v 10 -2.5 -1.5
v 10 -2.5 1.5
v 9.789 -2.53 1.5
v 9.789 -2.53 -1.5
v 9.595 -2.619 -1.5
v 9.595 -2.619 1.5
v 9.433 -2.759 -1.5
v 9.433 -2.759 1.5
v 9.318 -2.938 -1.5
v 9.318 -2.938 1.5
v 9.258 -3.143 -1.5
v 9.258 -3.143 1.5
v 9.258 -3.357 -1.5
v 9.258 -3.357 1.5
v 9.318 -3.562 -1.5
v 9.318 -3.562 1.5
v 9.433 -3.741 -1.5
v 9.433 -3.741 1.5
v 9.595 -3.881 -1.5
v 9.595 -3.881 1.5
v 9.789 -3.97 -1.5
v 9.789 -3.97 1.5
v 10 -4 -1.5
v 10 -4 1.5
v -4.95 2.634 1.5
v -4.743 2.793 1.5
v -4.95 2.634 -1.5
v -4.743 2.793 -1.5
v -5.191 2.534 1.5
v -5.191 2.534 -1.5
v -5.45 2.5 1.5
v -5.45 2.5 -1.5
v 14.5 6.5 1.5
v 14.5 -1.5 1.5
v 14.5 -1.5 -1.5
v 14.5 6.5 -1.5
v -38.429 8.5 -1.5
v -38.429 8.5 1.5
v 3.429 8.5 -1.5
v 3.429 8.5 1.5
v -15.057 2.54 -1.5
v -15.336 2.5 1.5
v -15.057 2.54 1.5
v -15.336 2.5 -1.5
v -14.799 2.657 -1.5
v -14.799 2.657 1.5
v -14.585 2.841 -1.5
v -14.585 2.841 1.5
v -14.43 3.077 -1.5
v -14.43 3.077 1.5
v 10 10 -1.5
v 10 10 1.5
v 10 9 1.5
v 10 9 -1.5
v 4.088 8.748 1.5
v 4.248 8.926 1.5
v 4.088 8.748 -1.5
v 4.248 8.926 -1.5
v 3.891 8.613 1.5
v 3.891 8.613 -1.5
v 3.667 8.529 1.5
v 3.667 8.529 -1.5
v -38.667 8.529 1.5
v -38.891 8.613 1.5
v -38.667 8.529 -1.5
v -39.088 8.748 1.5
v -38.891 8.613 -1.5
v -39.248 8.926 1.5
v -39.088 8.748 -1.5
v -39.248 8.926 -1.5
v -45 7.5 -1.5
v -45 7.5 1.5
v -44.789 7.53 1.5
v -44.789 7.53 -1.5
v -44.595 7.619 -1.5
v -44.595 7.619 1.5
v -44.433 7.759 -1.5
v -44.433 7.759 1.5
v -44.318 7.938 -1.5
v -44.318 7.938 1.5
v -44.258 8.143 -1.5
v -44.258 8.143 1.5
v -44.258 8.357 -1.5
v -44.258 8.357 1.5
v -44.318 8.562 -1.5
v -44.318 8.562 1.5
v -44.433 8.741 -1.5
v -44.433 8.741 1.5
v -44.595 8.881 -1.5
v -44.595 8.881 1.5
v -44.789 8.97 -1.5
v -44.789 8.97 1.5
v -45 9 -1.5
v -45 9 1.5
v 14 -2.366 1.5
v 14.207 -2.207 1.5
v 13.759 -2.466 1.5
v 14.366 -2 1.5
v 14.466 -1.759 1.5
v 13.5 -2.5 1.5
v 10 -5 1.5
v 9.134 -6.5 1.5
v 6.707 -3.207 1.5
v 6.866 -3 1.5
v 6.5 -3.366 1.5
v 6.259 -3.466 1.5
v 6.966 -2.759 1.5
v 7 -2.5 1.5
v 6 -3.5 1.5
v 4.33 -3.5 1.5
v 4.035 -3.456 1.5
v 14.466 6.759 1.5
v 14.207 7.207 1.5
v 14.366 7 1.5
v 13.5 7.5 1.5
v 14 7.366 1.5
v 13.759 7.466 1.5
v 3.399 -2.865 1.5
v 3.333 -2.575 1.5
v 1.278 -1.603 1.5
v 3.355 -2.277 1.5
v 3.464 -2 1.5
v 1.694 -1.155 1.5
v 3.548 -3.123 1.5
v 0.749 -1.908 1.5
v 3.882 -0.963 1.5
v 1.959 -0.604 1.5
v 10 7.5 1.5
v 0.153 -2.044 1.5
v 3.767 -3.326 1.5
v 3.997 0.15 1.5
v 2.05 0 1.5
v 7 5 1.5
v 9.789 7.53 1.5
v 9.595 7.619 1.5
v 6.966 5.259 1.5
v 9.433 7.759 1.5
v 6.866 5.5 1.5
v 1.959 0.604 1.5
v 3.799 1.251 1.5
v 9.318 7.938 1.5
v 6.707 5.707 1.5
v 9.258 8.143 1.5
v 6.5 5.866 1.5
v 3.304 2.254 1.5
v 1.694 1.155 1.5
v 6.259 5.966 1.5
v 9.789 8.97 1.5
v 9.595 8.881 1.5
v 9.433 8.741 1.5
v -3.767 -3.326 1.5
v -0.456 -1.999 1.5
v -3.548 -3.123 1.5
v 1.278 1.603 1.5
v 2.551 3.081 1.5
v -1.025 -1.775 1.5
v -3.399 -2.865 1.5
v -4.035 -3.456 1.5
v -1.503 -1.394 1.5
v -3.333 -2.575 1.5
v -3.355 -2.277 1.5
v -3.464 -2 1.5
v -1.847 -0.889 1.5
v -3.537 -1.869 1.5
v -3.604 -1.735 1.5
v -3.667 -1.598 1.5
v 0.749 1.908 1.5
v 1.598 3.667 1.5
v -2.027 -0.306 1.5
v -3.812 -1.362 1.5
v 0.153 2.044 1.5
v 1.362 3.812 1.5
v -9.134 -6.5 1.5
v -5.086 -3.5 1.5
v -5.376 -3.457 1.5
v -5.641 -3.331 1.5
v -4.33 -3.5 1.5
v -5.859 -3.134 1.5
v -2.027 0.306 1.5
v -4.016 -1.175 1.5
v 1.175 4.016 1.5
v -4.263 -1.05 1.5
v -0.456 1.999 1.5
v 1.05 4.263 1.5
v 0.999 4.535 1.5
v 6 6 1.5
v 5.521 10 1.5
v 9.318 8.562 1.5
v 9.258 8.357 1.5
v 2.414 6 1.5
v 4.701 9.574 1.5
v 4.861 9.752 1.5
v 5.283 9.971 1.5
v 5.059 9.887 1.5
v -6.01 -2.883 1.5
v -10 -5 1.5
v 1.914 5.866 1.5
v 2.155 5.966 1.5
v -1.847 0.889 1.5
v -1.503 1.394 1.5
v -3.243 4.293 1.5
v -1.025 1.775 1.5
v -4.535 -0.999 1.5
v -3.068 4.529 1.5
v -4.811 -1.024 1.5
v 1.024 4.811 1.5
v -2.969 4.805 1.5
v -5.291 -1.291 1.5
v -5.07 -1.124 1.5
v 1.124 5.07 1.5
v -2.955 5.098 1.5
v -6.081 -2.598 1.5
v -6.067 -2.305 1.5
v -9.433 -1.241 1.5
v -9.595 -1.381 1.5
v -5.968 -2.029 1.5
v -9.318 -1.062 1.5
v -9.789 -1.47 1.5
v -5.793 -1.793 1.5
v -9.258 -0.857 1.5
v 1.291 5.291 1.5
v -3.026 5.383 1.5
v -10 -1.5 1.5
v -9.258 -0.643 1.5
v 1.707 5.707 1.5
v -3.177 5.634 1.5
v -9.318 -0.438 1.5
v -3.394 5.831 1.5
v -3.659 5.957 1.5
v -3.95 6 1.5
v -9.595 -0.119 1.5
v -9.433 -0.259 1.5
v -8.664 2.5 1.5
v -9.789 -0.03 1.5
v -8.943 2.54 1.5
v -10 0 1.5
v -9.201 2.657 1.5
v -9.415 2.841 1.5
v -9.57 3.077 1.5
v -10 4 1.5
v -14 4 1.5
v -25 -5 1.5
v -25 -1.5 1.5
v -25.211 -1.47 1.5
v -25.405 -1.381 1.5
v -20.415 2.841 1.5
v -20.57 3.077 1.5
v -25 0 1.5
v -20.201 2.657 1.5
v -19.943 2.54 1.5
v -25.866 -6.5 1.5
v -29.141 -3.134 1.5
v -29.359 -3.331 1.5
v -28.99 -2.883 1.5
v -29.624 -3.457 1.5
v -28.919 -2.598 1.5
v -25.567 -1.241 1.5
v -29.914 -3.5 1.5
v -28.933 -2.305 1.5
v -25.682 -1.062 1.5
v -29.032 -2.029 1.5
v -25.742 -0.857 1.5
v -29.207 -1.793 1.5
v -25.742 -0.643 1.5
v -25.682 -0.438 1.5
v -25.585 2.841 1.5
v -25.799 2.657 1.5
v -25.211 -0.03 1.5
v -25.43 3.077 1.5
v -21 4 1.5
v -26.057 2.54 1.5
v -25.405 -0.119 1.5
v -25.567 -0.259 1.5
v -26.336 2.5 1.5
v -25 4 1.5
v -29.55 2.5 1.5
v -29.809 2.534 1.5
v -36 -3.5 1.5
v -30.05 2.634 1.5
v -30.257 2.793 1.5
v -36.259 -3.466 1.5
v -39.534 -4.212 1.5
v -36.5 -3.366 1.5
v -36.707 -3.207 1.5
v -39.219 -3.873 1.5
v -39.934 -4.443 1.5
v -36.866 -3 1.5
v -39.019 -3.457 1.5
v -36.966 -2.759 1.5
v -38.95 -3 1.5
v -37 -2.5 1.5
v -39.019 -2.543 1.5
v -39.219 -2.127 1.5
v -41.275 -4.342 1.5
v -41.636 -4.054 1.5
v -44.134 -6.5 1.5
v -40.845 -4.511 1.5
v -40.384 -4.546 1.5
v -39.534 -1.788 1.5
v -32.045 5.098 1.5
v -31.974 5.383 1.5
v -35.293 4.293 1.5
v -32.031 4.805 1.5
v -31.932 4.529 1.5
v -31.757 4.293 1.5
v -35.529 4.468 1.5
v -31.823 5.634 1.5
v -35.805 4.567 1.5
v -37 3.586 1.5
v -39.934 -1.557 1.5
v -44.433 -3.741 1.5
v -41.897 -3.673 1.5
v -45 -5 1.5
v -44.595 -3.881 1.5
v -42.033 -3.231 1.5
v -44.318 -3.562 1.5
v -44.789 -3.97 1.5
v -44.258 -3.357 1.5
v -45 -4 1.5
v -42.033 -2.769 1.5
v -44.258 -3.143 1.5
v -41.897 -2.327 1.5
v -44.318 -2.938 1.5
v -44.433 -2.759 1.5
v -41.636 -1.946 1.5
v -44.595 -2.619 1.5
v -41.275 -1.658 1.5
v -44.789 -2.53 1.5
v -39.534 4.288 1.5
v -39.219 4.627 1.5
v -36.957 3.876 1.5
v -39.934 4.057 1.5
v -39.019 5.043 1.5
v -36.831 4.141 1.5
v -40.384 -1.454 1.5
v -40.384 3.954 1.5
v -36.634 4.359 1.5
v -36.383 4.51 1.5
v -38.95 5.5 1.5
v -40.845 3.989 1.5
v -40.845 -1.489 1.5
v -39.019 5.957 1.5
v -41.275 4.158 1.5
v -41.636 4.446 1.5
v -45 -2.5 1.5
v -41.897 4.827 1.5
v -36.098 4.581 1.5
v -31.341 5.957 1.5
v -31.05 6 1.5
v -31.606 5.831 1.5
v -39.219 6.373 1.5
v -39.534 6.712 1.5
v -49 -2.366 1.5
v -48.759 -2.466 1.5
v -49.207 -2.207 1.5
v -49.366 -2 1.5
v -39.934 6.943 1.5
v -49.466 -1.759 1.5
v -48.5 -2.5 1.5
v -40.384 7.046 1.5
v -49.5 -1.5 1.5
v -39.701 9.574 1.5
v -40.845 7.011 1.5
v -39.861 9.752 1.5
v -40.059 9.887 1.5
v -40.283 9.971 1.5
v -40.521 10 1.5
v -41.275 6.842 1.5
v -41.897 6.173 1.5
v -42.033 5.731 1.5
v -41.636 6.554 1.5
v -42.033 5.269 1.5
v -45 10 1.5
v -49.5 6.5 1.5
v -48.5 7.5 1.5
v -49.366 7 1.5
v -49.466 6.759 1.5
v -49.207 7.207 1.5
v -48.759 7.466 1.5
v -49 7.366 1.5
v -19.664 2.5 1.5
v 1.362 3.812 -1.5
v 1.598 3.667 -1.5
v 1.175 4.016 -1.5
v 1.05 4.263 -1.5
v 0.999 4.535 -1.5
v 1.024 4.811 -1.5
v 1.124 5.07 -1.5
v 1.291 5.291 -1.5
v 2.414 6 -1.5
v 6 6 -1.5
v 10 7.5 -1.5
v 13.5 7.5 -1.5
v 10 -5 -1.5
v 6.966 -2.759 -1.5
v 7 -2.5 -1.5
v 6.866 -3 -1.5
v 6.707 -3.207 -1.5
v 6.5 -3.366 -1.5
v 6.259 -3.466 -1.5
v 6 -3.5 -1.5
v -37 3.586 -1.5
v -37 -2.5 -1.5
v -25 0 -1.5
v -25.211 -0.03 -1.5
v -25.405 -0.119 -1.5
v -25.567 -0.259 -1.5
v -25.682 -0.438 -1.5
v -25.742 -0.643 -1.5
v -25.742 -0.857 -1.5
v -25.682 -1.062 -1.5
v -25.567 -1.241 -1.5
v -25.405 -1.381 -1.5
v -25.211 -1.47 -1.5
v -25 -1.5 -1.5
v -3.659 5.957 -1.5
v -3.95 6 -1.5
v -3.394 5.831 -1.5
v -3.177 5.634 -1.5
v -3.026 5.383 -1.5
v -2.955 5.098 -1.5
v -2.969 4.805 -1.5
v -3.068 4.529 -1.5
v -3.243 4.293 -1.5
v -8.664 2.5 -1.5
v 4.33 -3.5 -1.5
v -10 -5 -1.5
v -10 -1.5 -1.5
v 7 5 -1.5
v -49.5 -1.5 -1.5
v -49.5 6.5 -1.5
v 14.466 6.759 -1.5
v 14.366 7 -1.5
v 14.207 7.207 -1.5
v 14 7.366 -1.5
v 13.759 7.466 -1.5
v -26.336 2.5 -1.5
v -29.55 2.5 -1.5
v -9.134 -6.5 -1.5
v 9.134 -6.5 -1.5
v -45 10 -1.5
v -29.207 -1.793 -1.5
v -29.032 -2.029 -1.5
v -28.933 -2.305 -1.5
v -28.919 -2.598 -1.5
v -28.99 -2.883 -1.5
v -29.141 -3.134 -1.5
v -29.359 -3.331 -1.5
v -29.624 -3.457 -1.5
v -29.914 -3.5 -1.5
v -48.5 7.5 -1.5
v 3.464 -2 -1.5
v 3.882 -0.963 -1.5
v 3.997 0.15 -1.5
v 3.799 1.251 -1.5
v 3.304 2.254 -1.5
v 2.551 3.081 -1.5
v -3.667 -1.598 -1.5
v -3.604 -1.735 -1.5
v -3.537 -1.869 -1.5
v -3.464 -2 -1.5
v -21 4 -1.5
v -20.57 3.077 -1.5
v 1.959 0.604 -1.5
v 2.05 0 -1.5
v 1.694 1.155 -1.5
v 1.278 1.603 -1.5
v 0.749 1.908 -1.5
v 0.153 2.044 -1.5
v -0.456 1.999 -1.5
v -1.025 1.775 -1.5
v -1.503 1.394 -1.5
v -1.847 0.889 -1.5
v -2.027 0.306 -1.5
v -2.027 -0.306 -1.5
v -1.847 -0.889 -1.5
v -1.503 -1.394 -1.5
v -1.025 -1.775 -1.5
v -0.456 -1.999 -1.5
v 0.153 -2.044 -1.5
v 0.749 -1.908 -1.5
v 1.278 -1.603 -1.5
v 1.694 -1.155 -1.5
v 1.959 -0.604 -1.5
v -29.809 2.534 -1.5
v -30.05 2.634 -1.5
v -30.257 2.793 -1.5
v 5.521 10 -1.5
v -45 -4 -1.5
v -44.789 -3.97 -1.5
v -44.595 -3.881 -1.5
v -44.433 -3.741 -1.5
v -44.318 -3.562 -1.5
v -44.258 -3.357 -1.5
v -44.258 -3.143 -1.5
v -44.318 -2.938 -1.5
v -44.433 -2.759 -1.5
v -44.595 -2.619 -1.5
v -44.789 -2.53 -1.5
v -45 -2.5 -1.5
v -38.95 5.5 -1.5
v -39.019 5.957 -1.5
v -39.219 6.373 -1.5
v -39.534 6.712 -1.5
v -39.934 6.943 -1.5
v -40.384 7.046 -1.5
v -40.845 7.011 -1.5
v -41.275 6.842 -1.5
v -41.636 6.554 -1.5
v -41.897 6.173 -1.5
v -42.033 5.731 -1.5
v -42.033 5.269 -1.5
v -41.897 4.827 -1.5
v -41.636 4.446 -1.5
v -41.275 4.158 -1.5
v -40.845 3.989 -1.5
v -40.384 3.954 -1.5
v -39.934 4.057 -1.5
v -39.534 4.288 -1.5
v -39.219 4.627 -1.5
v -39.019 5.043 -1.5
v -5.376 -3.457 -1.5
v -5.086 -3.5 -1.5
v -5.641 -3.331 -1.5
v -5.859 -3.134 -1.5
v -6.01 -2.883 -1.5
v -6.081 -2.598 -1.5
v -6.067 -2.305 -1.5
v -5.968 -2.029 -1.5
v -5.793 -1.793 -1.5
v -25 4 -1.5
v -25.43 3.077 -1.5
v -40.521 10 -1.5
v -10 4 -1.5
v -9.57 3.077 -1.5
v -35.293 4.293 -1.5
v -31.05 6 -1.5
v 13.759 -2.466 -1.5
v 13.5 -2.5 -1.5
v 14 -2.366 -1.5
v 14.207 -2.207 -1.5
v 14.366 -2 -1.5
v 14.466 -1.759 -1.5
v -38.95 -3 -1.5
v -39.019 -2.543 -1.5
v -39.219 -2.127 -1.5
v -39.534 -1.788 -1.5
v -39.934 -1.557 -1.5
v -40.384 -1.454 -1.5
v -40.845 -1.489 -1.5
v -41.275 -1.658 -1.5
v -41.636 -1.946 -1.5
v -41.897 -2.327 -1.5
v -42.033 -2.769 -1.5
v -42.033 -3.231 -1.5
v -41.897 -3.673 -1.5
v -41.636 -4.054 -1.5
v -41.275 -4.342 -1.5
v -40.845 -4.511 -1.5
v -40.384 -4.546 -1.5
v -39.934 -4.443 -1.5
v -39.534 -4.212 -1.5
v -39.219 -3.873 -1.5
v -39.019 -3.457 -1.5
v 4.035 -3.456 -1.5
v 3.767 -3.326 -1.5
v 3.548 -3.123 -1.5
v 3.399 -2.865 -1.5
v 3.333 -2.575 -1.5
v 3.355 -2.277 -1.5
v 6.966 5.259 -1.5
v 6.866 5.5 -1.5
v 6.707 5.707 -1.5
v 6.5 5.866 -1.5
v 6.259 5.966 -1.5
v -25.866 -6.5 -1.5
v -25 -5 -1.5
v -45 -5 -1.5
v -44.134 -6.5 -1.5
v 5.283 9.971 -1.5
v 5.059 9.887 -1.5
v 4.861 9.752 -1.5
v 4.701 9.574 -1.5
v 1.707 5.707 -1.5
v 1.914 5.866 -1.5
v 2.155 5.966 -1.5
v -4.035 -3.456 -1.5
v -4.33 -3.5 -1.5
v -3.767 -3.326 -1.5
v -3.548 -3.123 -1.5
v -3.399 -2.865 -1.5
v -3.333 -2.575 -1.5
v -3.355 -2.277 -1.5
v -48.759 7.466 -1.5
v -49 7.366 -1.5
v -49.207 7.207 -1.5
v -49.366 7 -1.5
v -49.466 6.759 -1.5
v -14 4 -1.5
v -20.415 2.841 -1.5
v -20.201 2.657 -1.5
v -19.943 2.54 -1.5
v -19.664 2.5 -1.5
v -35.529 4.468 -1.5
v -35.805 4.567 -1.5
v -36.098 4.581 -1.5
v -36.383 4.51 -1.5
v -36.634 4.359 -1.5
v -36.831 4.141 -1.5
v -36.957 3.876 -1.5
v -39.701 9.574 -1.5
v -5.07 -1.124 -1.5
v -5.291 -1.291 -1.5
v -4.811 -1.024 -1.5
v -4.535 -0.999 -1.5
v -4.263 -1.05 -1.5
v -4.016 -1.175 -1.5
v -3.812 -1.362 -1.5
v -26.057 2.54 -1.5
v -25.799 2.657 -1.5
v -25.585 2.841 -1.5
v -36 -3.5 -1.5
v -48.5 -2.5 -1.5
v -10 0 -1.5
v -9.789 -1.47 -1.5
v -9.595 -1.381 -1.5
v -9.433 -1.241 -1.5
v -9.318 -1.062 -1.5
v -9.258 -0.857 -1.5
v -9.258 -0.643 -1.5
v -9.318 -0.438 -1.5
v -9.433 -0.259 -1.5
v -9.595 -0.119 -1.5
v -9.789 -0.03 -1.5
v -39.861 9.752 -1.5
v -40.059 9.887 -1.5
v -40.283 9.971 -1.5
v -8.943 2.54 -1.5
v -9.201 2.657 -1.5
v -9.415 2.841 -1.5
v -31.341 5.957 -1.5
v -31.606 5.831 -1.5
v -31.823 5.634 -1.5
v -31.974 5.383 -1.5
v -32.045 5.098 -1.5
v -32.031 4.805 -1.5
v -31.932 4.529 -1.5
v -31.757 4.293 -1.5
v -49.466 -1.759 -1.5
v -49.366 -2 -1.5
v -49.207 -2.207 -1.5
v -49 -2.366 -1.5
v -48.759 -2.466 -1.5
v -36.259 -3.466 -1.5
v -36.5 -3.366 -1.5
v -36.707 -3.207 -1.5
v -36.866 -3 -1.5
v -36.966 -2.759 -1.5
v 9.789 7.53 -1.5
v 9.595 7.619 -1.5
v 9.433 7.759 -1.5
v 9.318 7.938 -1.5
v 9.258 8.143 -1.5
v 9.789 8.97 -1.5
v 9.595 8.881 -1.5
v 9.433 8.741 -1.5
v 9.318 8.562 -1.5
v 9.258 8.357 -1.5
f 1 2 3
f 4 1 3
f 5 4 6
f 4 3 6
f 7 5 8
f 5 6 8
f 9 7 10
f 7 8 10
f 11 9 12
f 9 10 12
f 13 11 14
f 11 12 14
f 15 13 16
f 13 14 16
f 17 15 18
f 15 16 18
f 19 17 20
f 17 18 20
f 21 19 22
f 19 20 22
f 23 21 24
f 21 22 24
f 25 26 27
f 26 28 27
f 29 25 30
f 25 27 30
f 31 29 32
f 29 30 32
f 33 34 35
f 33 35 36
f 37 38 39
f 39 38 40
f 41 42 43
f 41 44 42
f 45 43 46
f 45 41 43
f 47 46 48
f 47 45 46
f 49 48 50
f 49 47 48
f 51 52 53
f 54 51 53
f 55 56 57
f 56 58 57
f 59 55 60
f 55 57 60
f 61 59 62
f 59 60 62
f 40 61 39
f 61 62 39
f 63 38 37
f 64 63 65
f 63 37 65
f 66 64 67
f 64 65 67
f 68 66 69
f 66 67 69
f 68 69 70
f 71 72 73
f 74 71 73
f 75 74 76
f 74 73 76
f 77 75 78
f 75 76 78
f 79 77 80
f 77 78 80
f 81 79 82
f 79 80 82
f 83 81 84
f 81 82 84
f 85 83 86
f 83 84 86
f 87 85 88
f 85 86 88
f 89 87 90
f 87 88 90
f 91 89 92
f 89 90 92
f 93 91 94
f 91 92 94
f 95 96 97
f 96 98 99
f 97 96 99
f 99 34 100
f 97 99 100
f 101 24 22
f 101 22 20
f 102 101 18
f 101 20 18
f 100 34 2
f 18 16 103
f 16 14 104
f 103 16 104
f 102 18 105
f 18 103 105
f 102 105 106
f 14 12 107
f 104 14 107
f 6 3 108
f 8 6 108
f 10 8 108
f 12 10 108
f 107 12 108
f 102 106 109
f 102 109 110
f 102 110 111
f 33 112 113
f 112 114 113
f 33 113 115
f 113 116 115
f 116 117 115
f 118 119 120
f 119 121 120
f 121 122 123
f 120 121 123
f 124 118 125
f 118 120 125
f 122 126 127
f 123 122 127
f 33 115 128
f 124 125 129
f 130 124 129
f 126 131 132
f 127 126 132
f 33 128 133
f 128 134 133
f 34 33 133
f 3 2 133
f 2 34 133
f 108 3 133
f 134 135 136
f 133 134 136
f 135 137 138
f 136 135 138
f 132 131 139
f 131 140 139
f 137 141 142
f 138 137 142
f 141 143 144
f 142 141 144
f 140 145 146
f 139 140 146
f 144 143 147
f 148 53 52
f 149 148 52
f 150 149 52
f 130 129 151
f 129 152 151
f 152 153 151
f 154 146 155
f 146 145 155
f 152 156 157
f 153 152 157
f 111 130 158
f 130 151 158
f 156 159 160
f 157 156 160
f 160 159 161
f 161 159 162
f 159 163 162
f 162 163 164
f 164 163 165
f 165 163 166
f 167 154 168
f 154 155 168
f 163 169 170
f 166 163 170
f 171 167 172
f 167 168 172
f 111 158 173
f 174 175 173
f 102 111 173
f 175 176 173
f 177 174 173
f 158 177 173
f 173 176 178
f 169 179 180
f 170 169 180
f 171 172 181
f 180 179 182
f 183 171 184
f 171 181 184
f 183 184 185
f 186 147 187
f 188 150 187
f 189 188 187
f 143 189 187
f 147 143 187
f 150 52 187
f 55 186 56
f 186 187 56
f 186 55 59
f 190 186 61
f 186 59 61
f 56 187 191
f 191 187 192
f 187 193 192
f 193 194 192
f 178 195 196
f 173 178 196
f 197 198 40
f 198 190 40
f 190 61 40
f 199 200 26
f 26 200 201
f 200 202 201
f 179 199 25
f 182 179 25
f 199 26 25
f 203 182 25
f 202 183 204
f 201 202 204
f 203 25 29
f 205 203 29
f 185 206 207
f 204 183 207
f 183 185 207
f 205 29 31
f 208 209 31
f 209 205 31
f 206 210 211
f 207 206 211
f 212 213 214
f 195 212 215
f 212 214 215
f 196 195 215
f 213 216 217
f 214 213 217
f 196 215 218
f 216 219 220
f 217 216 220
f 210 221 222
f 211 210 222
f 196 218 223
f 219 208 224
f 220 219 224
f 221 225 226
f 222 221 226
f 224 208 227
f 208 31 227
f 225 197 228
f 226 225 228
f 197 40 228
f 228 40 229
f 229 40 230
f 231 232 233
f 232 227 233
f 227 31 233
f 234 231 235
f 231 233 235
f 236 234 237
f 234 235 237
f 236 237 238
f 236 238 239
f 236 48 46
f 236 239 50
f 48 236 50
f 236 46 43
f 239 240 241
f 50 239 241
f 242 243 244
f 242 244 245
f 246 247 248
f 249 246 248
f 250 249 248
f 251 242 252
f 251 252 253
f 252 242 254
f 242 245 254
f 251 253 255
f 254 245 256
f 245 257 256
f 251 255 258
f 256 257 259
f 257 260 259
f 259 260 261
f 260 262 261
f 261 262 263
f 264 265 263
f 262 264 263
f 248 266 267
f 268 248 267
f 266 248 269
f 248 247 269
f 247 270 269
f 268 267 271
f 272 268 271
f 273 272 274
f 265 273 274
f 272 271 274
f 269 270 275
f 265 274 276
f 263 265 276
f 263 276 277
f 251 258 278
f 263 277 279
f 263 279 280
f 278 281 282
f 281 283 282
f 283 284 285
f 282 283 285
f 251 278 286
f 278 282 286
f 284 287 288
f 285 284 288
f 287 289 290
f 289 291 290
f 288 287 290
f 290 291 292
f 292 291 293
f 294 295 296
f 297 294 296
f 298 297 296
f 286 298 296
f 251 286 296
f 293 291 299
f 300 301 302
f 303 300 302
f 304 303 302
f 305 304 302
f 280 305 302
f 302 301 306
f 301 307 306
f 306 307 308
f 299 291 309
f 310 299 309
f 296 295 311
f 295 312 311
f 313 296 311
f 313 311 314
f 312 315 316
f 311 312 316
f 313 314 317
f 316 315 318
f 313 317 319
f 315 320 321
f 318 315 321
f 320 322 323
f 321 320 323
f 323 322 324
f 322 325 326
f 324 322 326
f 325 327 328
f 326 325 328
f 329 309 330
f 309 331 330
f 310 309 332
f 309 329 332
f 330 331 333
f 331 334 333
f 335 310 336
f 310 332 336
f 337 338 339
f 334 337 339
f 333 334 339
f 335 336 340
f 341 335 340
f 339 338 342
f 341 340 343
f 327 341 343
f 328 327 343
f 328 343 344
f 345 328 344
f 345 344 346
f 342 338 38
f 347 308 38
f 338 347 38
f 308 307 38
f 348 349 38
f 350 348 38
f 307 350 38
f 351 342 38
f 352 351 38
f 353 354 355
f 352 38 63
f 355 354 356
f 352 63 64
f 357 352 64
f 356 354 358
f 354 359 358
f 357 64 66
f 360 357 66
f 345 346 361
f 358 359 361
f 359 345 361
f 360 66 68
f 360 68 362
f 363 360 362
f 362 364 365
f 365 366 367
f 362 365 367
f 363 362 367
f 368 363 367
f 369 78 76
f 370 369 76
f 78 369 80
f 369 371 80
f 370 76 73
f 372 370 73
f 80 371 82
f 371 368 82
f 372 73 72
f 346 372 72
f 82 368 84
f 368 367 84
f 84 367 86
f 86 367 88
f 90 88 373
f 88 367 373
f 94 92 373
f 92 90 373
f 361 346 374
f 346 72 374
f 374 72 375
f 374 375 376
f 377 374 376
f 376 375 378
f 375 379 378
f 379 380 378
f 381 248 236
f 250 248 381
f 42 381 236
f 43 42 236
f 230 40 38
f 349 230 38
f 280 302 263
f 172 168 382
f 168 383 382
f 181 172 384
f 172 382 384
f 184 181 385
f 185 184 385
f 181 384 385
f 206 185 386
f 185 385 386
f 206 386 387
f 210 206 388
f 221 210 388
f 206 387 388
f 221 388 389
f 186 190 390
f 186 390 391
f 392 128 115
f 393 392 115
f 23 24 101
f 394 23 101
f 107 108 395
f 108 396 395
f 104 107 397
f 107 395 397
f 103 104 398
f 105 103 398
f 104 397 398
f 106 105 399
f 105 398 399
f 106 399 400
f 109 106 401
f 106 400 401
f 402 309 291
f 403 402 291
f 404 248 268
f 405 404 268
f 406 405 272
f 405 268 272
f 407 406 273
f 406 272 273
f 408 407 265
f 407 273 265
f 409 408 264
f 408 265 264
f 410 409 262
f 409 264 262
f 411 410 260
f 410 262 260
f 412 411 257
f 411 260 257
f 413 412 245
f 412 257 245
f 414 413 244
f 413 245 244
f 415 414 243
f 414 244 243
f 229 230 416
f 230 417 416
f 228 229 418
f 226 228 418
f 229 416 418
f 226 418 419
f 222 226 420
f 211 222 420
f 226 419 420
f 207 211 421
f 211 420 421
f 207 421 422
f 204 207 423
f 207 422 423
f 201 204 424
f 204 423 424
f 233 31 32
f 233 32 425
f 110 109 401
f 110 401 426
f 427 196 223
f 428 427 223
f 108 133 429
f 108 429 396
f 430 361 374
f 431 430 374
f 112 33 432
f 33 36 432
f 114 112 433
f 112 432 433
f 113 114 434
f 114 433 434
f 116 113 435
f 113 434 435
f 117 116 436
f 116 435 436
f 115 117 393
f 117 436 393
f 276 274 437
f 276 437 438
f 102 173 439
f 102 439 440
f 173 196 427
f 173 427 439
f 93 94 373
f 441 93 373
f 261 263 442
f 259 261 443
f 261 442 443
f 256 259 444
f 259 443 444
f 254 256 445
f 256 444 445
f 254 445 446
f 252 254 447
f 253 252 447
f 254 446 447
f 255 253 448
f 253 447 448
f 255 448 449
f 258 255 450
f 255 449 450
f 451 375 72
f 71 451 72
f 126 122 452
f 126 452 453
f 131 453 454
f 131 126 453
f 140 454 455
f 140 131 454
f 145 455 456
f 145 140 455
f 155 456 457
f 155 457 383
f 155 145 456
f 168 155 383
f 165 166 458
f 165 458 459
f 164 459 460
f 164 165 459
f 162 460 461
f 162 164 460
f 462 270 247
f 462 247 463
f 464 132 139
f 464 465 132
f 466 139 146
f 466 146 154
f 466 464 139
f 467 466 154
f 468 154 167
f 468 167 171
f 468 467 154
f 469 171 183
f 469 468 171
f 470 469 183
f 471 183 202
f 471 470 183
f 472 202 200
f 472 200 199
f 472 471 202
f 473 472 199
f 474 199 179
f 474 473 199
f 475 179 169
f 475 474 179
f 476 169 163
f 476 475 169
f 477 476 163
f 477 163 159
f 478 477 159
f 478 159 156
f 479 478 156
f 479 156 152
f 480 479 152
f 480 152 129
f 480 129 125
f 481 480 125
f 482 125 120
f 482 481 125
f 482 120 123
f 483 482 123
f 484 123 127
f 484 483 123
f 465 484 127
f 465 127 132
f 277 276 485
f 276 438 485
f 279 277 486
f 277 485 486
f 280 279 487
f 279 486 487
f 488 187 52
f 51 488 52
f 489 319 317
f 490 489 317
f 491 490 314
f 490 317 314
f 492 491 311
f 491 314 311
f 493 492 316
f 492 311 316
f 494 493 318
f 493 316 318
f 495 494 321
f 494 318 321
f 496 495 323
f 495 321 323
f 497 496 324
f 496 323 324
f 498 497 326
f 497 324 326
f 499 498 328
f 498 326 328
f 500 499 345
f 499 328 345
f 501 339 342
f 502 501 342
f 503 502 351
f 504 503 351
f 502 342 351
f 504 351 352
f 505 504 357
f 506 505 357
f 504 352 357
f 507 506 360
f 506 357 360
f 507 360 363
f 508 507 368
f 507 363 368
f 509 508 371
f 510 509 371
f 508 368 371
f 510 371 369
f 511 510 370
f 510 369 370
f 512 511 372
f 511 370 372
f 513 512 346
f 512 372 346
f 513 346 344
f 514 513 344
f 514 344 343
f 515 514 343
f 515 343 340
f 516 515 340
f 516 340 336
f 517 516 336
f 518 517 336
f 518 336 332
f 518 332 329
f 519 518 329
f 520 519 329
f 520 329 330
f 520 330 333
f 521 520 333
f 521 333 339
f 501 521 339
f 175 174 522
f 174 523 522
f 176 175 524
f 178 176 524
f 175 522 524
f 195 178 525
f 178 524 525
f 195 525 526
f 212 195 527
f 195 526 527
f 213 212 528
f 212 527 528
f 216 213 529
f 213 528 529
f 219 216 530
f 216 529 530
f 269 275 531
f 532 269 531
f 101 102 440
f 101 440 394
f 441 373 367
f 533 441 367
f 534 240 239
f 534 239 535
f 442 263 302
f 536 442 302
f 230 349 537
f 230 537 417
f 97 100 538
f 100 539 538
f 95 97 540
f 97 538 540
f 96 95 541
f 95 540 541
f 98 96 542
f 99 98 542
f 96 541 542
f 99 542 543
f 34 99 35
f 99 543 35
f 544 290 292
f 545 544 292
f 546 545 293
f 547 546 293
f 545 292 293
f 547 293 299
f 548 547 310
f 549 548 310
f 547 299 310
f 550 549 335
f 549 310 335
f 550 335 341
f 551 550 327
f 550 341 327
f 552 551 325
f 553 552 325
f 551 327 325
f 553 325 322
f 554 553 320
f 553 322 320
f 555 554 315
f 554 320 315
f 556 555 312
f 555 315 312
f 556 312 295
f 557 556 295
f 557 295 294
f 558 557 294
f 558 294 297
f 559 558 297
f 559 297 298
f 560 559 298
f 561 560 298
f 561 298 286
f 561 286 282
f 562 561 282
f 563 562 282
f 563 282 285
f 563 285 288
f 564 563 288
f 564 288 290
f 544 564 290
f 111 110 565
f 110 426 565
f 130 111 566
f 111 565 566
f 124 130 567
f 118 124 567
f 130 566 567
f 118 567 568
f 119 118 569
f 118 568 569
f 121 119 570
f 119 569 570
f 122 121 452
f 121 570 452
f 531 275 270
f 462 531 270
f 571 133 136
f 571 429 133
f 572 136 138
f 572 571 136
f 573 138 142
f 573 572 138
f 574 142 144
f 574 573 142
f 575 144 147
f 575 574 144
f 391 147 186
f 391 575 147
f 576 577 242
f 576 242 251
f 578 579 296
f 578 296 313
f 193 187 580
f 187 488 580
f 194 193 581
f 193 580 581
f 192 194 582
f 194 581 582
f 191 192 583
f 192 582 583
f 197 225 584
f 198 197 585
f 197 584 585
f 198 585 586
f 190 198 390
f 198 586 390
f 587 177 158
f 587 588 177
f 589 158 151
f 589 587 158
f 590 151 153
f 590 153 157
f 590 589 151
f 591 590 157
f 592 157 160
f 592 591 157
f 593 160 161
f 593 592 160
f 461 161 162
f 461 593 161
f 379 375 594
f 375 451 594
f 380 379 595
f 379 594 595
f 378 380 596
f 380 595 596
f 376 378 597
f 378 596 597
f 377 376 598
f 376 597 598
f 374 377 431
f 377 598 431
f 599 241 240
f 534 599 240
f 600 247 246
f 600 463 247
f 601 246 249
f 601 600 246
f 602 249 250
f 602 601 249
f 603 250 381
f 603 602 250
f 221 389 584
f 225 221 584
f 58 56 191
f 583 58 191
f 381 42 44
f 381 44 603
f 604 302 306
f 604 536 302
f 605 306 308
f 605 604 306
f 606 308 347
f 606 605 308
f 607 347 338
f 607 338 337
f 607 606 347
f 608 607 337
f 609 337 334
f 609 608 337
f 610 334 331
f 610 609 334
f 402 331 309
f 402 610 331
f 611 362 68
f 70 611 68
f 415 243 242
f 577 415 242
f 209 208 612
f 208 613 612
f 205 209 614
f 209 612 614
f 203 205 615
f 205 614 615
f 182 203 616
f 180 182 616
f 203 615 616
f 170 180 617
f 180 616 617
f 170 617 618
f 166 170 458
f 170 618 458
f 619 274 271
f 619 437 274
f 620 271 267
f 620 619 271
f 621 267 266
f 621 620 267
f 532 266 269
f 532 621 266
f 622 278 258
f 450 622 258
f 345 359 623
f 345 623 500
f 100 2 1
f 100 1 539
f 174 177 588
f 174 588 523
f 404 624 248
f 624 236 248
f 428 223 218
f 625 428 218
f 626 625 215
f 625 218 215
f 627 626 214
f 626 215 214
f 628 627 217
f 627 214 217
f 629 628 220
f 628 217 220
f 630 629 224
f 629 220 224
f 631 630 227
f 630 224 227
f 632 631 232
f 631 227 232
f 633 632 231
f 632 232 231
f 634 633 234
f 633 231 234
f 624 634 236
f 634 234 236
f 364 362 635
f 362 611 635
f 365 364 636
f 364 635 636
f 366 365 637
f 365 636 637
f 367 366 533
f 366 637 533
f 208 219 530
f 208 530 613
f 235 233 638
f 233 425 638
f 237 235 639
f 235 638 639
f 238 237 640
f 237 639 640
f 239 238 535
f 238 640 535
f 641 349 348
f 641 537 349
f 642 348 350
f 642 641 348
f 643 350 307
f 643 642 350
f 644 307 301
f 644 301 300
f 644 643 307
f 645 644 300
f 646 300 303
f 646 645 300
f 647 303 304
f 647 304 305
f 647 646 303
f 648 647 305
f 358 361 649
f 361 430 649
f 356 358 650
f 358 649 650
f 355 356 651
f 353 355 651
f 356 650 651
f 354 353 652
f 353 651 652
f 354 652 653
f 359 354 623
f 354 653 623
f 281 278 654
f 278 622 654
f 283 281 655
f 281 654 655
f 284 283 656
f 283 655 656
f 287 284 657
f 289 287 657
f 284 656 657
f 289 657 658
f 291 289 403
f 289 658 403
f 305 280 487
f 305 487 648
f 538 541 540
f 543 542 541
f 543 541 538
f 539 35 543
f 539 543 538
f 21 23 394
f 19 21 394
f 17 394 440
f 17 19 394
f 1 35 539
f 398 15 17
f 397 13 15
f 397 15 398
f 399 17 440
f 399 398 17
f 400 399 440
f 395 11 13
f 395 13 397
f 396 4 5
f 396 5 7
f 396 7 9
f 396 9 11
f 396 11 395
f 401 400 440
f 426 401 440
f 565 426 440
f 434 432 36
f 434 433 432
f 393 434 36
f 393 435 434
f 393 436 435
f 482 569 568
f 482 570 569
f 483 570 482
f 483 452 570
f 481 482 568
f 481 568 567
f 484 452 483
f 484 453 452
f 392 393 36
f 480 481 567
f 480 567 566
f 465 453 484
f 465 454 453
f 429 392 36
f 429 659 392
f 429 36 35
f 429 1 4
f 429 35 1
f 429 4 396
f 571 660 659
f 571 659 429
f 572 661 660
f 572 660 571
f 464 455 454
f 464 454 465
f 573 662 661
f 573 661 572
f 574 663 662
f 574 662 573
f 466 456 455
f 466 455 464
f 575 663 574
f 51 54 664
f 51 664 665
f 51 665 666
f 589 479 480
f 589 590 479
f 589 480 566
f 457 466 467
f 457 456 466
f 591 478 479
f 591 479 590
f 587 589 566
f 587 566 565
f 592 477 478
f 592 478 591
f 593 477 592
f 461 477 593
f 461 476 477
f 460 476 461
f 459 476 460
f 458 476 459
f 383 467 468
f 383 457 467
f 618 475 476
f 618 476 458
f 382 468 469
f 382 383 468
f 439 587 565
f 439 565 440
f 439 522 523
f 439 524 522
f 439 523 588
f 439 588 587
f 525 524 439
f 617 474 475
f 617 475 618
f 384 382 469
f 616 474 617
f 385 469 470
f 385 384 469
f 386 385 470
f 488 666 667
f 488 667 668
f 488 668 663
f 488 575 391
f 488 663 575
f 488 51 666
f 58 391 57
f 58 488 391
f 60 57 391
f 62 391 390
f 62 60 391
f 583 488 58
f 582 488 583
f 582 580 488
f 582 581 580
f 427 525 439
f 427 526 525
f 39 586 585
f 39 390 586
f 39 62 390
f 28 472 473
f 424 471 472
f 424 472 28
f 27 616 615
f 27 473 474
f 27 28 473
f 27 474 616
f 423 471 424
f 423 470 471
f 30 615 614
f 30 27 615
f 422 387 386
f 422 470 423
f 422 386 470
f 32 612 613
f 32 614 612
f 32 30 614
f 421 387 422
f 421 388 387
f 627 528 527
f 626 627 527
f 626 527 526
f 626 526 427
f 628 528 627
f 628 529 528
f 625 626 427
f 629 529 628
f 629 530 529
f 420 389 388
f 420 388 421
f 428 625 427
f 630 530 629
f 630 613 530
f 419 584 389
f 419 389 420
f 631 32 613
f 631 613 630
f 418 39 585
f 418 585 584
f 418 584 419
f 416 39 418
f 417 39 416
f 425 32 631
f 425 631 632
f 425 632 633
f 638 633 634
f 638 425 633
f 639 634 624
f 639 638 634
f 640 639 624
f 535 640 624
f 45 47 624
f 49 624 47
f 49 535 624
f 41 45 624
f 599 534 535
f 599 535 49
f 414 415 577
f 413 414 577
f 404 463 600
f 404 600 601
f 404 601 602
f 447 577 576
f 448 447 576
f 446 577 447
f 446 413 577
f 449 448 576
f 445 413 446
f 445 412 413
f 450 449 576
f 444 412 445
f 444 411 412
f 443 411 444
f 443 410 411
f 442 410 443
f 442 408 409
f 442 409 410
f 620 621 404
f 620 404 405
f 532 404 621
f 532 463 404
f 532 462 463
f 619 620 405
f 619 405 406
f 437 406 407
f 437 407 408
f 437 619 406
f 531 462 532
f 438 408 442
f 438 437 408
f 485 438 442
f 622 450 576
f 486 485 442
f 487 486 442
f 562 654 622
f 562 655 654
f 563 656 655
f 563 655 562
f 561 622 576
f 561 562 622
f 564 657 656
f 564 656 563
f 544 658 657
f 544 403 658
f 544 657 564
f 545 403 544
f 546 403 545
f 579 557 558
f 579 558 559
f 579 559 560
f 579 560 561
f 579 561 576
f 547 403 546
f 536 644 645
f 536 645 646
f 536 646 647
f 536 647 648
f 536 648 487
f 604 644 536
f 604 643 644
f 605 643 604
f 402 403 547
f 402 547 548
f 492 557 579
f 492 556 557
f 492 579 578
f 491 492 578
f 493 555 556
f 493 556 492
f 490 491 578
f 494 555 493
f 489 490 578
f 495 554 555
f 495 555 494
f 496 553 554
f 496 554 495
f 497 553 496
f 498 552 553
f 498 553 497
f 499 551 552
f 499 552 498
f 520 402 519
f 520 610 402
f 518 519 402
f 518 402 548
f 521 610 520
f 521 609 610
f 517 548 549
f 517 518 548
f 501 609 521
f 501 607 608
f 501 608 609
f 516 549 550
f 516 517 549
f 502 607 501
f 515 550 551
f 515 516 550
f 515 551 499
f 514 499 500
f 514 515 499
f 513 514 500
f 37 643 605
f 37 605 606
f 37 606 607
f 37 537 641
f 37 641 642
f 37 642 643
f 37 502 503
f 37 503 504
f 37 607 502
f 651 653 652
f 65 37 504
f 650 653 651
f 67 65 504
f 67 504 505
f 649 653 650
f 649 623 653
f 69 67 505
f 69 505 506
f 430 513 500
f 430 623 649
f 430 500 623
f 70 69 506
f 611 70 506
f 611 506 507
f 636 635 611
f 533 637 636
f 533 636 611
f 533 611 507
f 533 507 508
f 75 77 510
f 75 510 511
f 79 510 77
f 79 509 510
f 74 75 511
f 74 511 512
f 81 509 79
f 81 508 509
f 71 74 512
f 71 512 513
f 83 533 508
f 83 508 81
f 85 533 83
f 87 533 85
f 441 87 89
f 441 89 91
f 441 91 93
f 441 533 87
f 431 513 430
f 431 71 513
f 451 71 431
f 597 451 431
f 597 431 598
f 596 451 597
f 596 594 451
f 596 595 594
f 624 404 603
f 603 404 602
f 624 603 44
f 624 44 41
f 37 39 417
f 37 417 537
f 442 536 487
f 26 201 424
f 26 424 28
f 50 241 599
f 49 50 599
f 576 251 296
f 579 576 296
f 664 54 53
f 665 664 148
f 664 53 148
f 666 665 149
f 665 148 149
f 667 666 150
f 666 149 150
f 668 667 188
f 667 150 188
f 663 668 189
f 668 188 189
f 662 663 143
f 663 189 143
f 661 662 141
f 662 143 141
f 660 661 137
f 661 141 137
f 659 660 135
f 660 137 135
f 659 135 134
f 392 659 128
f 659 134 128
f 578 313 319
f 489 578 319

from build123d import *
from OCP.BRepFilletAPI import BRepFilletAPI_MakeChamfer

# Parameters (mm, degrees)
SKETCH_1_R          = 2.05
EXTRUDE_1_DEPTH     = 1.5
SKETCH_2_W          = 4.5
SKETCH_2_H          = 10
EXTRUDE_2_DEPTH     = 3
SKETCH_3_R          = 0.75
CUT_EXTRUDE_1_DEPTH = 51.589030432
FILLET_1_R          = 1
EXTRUDE_3_DEPTH     = 3
CUT_EXTRUDE_2_DEPTH = 51.589030432
FILLET_2_R          = 1
SKETCH_6_R          = 1.55
CUT_EXTRUDE_3_DEPTH = 51.589030432
CUT_EXTRUDE_4_DEPTH = 51.589030432
FILLET_3_R          = 1
CUT_EXTRUDE_5_DEPTH = 51.589030432
FILLET_4_R          = 1
SKETCH_9_W          = 4
SKETCH_9_H          = 1.5
EXTRUDE_4_DEPTH     = 3
CHAMFER_1_SIZE      = 0.699461487
CHAMFER_1_SIZE_2    = 1.5
FILLET_5_R          = 1


with BuildPart() as part:
    # 草图1 → 凸台-拉伸1 (new, symmetric)
    with BuildSketch(Plane.XY):
        Polygon((10, 10), (10, -5), (-10, -5), (-10, 0), (-25, 0), (-25, -5), (-45, -5), (-45, 10), align=None)
        Circle(SKETCH_1_R, mode=Mode.SUBTRACT)
    extrude(amount=EXTRUDE_1_DEPTH, both=True)

    # 草图2 → 凸台-拉伸2 (add)
    with BuildSketch(Plane.XY.offset(1.5)):
        with Locations((12.25, 2.5)):
            Rectangle(SKETCH_2_W, SKETCH_2_H)
        with Locations((-47.25, 2.5)):
            Rectangle(SKETCH_2_W, SKETCH_2_H)
    extrude(amount=-EXTRUDE_2_DEPTH)

    # 草图3 → 切除-拉伸1 (cut, through all)
    with BuildSketch(Plane.XY.offset(1.5)):
        with Locations((-45, 8.25)):
            Circle(SKETCH_3_R)
        with Locations((-45, -3.25)):
            Circle(SKETCH_3_R)
        with Locations((10, 8.25)):
            Circle(SKETCH_3_R)
        with Locations((10, -3.25)):
            Circle(SKETCH_3_R)
        with Locations((-25, -0.75)):
            Circle(SKETCH_3_R)
        with Locations((-10, -0.75)):
            Circle(SKETCH_3_R)
    extrude(amount=-CUT_EXTRUDE_1_DEPTH, mode=Mode.SUBTRACT)

    # 圆角1
    fillet_1_edges = [part.edges().sort_by_distance(p)[0] for p in [
        (14.5, -2.5, 0),
        (14.5, 7.5, 0),
        (-49.5, 7.5, 0),
        (-49.5, -2.5, 0),
    ]]
    fillet(fillet_1_edges, radius=FILLET_1_R)

    # 草图4 → 凸台-拉伸3 (add)
    with BuildSketch(Plane.XY.offset(1.5)):
        Polygon((-10, -5), (-9.133974596, -6.5), (9.133974596, -6.5), (10, -5), align=None)
    extrude_3 = extrude(amount=-EXTRUDE_3_DEPTH)

    # 镜向1: 凸台-拉伸3 across plane
    add(extrude_3.mirror(Plane(origin=(-17.5, 0, 0), x_dir=(0, 0, 1), z_dir=(1, 0, 0))))

    # 草图5 → 切除-拉伸2 (cut, through all)
    with BuildSketch(Plane.XY.offset(1.5)):
        Polygon((-40, 10), (-38.949688693, 8.5), (3.949688693, 8.5), (5, 10), align=None)
    extrude(amount=-CUT_EXTRUDE_2_DEPTH, mode=Mode.SUBTRACT)

    # 圆角2
    fillet_2_edges = [part.edges().sort_by_distance(p)[0] for p in [
        (-40, 10, 0),
        (5, 10, 0),
        (3.949688693, 8.5, 0),
        (-38.949688693, 8.5, 0),
    ]]
    fillet(fillet_2_edges, radius=FILLET_2_R)

    # 草图6 → 切除-拉伸3 (cut, through all)
    with BuildSketch(Plane.XY.offset(1.5)):
        with Locations((-40.5, 5.5)):
            Circle(SKETCH_6_R)
        with Locations((-40.5, -3)):
            Circle(SKETCH_6_R)
    extrude(amount=-CUT_EXTRUDE_3_DEPTH, mode=Mode.SUBTRACT)

    # 草图7 → 切除-拉伸4 (cut, through all)
    with BuildSketch(Plane.XY.offset(1.5)):
        Polygon((-37, 6), (-37, -3.5), (-27.5, -3.5), align=None)
        Polygon((-33.464466094, 6), (-1.535533906, 6), (-5.035533906, 2.5), (-29.964466094, 2.5), align=None)
    extrude(amount=-CUT_EXTRUDE_4_DEPTH, mode=Mode.SUBTRACT)

    # 圆角3
    fillet_3_edges = [part.edges().sort_by_distance(p)[0] for p in [
        (-29.964466094, 2.5, 0),
        (-33.464466094, 6, 0),
        (-1.535533906, 6, 0),
        (-5.035533906, 2.5, 0),
        (-37, 6, 0),
        (-27.5, -3.5, 0),
        (-37, -3.5, 0),
    ]]
    fillet(fillet_3_edges, radius=FILLET_3_R)

    # 草图8 → 切除-拉伸5 (cut, through all)
    with BuildSketch(Plane.XY.offset(1.5)):
        with BuildLine():
            Line((7, 6), (7, -3.5))
            Line((7, -3.5), (1.936491673, -3.5))
            ThreePointArc((1.936491673, -3.5), (3.872983346, 1), (0, 4))
            Line((0, 4), (2, 6))
            Line((2, 6), (7, 6))
        make_face()
        with BuildLine():
            Line((-1.936491673, -3.5), (-7.5, -3.5))
            Line((-7.5, -3.5), (-4, 0))
            ThreePointArc((-4, 0), (-3.445719569, -2.031506006), (-1.936491673, -3.5))
        make_face()
    extrude(amount=-CUT_EXTRUDE_5_DEPTH, mode=Mode.SUBTRACT)

    # 圆角4
    fillet_4_edges = [part.edges().sort_by_distance(p)[0] for p in [
        (2, 6, 0),
        (7, 6, 0),
        (7, -3.5, 0),
        (1.936491673, -3.5, 0),
        (0, 4, 0),
        (-4, 0, 0),
        (-1.936491673, -3.5, 0),
        (-7.5, -3.5, 0),
    ]]
    fillet(fillet_4_edges, radius=FILLET_4_R)

    # 草图9 → 凸台-拉伸4 (add)
    with BuildSketch(Plane.XY.offset(1.5)):
        with Locations((-23, 3.25)):
            Rectangle(SKETCH_9_W, SKETCH_9_H)
        with Locations((-12, 3.25)):
            Rectangle(SKETCH_9_W, SKETCH_9_H)
    extrude(amount=-EXTRUDE_4_DEPTH)

    # 倒角1
    chamfer_1_edges_1 = [part.edges().sort_by_distance(p)[0] for p in [
        (-14, 2.5, 0),
    ]]
    chamfer_1_side_1 = [part.faces().sort_by_distance(p)[0] for p in [
        (-14.01398923, 2.5, 0),
    ]]
    chamfer_1_edges_2 = [part.edges().sort_by_distance(p)[0] for p in [
        (-10, 2.5, 0),
    ]]
    chamfer_1_side_2 = [part.faces().sort_by_distance(p)[0] for p in [
        (-9.98601077, 2.5, 0),
    ]]
    chamfer_1_edges_3 = [part.edges().sort_by_distance(p)[0] for p in [
        (-21, 2.5, 0),
    ]]
    chamfer_1_side_3 = [part.faces().sort_by_distance(p)[0] for p in [
        (-20.98601077, 2.5, 0),
    ]]
    chamfer_1_edges_4 = [part.edges().sort_by_distance(p)[0] for p in [
        (-25, 2.5, 0),
    ]]
    chamfer_1_side_4 = [part.faces().sort_by_distance(p)[0] for p in [
        (-25.01398923, 2.5, 0),
    ]]
    chamfer_1 = BRepFilletAPI_MakeChamfer(part.part.solid().wrapped)
    for e in chamfer_1_edges_1:
        chamfer_1.Add(CHAMFER_1_SIZE - 0.0001, CHAMFER_1_SIZE_2 - 0.0001, e.wrapped, chamfer_1_side_1[0].wrapped)
    for e in chamfer_1_edges_2:
        chamfer_1.Add(CHAMFER_1_SIZE - 0.0001, CHAMFER_1_SIZE_2 - 0.0001, e.wrapped, chamfer_1_side_2[0].wrapped)
    for e in chamfer_1_edges_3:
        chamfer_1.Add(CHAMFER_1_SIZE - 0.0001, CHAMFER_1_SIZE_2 - 0.0001, e.wrapped, chamfer_1_side_3[0].wrapped)
    for e in chamfer_1_edges_4:
        chamfer_1.Add(CHAMFER_1_SIZE - 0.0001, CHAMFER_1_SIZE_2 - 0.0001, e.wrapped, chamfer_1_side_4[0].wrapped)
    add(Compound.cast(chamfer_1.Shape()), mode=Mode.REPLACE)  # a hair under: the kernel refuses the full size

    # 圆角5
    fillet_5_edges = [part.edges().sort_by_distance(p)[0] for p in [
        (-20.300638513, 2.5, 0),
        (-14.699361487, 2.5, 0),
        (-9.300638513, 2.5, 0),
        (-25.699361487, 2.5, 0),
    ]]
    fillet(fillet_5_edges, radius=FILLET_5_R)


solid = part.part
